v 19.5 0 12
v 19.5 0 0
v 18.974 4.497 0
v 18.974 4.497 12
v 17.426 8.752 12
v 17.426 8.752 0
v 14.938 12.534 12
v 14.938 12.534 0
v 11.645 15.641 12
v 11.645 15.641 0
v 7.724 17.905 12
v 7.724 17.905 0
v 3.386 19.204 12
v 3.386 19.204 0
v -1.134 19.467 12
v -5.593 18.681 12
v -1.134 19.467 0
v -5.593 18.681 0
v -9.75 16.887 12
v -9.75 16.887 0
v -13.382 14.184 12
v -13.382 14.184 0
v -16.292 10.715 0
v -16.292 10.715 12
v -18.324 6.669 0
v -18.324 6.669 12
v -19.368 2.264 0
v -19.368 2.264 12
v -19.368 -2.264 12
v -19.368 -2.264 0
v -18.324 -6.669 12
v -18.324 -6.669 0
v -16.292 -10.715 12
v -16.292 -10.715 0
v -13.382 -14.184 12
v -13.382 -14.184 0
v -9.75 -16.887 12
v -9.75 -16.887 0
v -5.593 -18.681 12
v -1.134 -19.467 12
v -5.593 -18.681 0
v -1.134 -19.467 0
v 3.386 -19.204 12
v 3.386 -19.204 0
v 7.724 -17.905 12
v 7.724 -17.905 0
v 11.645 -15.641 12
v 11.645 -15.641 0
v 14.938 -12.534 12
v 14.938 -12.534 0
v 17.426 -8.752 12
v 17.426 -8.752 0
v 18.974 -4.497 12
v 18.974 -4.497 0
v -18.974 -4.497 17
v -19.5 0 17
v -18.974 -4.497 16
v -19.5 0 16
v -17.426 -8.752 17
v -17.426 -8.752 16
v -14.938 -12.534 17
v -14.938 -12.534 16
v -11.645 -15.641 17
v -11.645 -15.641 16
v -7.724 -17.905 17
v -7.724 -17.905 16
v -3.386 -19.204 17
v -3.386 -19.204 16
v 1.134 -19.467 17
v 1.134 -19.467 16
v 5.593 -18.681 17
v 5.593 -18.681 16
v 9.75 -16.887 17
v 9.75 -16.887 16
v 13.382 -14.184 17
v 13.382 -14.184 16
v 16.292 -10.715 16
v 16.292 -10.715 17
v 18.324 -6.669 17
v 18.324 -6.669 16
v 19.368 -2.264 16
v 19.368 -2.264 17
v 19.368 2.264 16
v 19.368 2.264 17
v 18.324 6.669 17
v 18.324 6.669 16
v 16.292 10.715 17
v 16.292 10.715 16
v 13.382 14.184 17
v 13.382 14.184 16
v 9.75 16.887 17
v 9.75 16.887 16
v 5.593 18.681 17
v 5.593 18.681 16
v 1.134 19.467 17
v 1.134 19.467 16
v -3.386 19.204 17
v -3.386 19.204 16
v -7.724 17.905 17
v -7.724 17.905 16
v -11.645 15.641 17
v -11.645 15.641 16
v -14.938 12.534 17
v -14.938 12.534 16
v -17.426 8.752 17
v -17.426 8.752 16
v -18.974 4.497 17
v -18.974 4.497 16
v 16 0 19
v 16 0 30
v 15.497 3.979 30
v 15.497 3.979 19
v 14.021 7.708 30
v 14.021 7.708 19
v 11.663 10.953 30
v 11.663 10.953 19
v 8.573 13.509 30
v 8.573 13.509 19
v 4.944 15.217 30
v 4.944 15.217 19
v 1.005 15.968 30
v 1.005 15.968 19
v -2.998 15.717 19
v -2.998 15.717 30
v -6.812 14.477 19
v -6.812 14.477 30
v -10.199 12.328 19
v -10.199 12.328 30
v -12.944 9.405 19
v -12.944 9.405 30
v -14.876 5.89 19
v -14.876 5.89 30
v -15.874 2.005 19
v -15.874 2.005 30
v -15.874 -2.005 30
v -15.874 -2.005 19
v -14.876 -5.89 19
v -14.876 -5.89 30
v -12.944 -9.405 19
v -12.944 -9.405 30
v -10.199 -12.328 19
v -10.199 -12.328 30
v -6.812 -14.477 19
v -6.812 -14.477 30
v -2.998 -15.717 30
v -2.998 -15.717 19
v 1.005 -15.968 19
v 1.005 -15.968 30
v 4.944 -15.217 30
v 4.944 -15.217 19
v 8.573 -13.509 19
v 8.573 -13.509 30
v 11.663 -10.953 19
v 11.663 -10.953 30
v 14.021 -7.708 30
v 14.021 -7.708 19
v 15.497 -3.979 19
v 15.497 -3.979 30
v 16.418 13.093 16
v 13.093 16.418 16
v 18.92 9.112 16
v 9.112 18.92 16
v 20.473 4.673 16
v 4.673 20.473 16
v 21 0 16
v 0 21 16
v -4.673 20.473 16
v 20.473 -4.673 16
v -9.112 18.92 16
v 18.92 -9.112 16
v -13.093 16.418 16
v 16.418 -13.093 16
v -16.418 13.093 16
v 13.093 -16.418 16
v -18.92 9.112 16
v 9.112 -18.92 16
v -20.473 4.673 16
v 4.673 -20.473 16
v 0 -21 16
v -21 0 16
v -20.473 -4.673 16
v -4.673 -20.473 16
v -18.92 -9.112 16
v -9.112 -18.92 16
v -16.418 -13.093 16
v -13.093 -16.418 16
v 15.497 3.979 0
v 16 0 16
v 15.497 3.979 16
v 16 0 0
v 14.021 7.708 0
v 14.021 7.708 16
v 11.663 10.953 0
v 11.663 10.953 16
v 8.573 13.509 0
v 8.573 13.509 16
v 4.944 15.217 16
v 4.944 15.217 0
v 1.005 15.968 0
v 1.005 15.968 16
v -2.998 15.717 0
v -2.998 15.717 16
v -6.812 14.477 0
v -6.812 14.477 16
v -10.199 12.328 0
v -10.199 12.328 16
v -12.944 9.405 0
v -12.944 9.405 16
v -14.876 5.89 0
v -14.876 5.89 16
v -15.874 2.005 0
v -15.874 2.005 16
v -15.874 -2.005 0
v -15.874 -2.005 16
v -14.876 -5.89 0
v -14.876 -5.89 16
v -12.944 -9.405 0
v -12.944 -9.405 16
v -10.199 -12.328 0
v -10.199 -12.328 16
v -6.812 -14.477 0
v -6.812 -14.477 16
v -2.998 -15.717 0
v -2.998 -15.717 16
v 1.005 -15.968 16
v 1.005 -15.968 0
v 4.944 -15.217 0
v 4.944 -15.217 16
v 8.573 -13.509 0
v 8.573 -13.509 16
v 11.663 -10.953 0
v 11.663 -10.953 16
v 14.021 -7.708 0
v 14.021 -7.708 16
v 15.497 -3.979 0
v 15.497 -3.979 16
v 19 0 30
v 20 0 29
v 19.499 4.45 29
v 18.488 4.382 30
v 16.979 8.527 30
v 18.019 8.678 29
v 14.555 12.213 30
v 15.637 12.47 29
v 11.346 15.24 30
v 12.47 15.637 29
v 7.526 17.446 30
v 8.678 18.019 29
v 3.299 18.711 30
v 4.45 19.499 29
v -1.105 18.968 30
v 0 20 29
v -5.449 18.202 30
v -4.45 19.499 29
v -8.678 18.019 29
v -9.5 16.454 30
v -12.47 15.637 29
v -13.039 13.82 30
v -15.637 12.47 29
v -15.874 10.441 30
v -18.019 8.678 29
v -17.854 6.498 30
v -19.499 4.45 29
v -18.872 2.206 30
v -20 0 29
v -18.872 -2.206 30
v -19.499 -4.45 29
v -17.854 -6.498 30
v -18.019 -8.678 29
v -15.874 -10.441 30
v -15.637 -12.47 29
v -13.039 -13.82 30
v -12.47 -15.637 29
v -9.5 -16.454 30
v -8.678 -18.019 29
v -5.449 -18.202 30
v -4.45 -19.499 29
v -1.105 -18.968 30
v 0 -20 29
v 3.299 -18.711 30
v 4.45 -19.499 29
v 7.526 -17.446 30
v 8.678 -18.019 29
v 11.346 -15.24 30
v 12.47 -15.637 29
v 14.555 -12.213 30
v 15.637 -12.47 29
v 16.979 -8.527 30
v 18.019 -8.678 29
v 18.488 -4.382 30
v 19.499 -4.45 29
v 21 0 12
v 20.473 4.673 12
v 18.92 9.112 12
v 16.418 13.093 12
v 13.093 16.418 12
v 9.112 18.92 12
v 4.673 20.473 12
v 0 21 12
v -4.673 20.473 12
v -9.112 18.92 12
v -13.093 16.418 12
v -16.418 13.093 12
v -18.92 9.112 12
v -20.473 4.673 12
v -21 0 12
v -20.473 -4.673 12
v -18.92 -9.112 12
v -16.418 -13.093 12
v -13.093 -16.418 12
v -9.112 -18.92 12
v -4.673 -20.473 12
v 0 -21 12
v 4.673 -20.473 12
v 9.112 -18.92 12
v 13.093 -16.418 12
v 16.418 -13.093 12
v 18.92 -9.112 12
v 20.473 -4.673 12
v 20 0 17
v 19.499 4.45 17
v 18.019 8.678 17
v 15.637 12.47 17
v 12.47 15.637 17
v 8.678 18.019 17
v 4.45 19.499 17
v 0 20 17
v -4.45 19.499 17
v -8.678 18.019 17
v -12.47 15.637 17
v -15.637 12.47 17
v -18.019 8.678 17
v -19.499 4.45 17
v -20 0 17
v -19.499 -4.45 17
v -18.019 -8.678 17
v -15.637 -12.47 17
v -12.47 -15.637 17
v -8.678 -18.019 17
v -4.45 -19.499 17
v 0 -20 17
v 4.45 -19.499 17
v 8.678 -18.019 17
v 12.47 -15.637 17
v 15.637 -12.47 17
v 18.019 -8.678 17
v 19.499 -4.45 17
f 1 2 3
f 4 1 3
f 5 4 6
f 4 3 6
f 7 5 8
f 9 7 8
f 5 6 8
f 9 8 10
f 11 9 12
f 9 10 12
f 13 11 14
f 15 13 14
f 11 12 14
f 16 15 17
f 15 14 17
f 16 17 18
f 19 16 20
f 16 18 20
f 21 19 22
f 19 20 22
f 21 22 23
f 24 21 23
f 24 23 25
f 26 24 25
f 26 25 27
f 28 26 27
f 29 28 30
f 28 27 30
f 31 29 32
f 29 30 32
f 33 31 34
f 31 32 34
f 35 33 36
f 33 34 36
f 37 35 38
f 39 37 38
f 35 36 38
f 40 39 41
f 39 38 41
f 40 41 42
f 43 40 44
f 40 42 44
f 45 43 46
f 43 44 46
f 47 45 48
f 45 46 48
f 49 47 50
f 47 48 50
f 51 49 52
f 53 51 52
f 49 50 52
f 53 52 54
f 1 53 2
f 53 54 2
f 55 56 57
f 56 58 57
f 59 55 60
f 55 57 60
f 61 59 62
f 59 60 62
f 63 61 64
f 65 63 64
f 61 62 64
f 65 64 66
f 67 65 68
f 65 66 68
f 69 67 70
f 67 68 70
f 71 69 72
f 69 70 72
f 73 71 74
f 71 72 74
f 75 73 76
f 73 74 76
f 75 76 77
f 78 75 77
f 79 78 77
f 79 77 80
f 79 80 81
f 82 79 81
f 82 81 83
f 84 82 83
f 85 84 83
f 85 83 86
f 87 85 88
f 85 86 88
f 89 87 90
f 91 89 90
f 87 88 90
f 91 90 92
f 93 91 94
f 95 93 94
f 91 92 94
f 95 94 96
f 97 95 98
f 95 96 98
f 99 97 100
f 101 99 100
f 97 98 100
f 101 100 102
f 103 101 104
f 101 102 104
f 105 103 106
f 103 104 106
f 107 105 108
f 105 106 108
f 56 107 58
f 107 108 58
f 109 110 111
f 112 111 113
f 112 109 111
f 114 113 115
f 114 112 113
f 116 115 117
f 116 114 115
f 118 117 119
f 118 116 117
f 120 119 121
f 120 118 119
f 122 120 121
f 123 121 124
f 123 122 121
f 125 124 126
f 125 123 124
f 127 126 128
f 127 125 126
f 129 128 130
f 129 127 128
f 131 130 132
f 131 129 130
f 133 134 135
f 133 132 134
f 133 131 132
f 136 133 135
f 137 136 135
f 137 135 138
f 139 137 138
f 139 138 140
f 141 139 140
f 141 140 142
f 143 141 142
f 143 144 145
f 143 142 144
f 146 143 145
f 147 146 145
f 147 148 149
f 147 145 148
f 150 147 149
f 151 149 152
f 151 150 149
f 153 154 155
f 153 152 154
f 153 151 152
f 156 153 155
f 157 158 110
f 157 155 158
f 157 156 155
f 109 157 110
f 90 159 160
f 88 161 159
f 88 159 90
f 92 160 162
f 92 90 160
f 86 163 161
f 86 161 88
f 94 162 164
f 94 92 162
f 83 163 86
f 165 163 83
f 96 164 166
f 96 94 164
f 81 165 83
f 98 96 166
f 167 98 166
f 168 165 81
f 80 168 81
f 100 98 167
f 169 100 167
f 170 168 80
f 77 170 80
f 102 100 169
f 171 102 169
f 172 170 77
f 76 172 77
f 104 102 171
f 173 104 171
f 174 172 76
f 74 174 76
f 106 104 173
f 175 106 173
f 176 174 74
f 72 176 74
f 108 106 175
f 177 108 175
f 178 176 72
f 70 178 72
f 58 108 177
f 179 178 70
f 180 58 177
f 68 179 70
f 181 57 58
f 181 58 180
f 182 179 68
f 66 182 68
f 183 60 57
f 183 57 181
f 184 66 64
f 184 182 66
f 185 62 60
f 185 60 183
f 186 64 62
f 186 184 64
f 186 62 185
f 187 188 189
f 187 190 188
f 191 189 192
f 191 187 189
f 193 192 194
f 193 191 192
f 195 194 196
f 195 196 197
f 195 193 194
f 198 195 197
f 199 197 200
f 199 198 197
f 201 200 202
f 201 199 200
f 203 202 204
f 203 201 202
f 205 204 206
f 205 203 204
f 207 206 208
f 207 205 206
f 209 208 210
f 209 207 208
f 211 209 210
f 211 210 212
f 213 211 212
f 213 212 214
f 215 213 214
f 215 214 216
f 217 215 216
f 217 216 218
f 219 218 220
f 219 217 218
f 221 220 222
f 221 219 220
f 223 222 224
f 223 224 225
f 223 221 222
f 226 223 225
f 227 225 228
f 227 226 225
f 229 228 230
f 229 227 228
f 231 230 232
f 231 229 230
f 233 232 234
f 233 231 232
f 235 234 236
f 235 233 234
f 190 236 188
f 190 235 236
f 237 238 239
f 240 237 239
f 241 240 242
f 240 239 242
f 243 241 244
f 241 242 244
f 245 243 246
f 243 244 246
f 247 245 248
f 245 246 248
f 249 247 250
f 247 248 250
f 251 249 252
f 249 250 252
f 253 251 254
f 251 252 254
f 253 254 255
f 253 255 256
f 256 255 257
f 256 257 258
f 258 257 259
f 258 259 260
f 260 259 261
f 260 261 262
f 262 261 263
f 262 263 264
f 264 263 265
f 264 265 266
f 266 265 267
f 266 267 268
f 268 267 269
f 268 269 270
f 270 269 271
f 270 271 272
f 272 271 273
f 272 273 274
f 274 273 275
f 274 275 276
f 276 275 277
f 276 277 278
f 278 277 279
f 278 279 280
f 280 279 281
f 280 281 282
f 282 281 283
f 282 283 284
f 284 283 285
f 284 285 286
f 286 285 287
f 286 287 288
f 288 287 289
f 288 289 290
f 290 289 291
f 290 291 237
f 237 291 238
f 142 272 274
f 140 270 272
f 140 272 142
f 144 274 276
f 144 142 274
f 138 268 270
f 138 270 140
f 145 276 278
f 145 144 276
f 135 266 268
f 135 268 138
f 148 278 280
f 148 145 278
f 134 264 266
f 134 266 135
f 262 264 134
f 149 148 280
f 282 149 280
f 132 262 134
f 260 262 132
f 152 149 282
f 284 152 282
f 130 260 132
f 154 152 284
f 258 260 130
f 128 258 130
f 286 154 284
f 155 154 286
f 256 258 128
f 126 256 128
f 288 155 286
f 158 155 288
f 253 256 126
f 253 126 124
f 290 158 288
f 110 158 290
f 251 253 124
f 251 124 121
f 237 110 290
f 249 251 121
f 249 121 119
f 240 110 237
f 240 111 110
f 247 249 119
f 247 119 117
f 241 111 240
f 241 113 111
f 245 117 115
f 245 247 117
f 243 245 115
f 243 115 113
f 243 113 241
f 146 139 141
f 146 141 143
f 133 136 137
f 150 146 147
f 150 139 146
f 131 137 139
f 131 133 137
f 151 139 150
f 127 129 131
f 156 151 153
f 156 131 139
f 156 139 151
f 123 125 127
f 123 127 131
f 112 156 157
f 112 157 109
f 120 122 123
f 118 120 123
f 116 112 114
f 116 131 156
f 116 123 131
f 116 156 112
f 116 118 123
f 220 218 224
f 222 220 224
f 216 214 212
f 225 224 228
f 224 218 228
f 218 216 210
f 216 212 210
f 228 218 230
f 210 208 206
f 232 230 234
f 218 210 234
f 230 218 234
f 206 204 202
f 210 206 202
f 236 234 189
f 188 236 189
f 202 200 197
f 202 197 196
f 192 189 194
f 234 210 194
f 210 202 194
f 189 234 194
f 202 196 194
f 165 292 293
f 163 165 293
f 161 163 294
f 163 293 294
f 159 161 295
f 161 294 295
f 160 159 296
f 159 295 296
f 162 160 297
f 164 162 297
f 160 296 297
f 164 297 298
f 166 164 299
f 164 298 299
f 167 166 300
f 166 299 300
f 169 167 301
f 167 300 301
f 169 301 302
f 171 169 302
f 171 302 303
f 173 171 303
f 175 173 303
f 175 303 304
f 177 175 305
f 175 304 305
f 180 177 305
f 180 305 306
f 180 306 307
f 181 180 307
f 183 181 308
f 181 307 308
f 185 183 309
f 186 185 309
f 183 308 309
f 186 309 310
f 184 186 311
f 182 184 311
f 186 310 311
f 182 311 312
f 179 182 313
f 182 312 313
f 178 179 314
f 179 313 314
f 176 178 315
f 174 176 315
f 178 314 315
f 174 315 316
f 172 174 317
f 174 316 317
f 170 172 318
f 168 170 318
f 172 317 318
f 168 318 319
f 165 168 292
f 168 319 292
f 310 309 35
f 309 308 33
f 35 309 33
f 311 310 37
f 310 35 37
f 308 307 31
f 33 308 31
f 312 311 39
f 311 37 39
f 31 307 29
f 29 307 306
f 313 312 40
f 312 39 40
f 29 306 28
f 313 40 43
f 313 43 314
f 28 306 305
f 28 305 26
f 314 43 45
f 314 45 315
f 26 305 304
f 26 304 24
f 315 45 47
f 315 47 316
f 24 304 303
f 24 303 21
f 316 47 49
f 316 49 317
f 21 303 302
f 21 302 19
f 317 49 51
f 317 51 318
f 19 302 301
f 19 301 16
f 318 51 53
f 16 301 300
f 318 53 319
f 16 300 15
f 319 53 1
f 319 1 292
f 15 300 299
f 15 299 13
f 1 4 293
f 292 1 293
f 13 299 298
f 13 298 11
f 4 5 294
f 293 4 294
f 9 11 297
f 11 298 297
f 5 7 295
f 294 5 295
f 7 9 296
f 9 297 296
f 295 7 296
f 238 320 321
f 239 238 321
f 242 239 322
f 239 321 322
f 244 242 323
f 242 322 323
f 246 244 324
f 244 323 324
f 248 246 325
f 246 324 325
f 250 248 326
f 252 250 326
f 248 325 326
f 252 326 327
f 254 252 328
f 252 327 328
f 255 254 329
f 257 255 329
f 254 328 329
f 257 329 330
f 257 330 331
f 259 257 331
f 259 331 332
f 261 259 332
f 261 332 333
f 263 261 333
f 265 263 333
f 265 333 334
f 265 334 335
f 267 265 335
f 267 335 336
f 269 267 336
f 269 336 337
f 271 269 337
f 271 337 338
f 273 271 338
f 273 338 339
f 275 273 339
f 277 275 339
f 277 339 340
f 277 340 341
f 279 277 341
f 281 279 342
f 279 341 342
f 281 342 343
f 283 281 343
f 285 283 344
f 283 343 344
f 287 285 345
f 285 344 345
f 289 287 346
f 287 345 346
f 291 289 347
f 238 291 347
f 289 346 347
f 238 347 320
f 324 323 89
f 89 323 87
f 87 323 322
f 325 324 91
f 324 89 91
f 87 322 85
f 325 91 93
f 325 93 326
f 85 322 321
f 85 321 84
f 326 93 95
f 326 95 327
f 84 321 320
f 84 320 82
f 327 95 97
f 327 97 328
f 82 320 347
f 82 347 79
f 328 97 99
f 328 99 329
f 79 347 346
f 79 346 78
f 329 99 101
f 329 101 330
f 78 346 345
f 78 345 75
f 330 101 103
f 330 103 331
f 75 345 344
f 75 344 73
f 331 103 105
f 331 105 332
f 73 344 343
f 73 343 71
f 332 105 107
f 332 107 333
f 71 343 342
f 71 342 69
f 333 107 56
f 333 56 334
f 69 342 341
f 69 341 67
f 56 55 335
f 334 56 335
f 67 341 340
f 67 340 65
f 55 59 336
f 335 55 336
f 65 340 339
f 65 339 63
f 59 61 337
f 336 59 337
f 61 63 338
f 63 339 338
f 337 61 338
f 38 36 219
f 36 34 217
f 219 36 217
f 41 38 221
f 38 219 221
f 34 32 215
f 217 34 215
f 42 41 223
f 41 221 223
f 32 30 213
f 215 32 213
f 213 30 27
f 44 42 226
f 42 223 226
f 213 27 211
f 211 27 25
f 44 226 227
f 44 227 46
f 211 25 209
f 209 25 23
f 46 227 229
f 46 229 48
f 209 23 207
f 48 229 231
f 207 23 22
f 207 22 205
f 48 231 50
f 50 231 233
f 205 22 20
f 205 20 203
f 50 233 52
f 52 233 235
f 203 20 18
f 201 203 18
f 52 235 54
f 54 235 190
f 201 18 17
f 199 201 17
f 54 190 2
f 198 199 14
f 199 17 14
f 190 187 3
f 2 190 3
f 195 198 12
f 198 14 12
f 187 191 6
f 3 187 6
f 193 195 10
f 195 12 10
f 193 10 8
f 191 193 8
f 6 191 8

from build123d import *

# Parameters (mm, degrees)
SKETCH_1_R          = 19.5
SKETCH_1_R_2        = 16
EXTRUDE_1_DEPTH     = 12
SKETCH_2_R          = 21
SKETCH_2_R_2        = 16
EXTRUDE_2_DEPTH     = 4
SKETCH_3_R          = 20
EXTRUDE_3_DEPTH     = 3
SKETCH_4_R          = 20
SKETCH_4_R_2        = 16
EXTRUDE_4_DEPTH     = 14
SKETCH_6_R          = 20
SKETCH_6_R_2        = 19
CUT_EXTRUDE_1_DEPTH = 1.5
CUT_EXTRUDE_START   = -3
SKETCH_7_R          = 20
CUT_EXTRUDE_2_DEPTH = 3
CHAMFER_1_SIZE      = 1
SKETCH_8_W          = 0.5
SKETCH_8_H          = 1


with BuildPart() as part:
    # 草图1 → 拉伸1 (new body)
    with BuildSketch(Plane.XY):
        Circle(SKETCH_1_R)
        Circle(SKETCH_1_R_2, mode=Mode.SUBTRACT)
    extrude(amount=EXTRUDE_1_DEPTH)

    # 草图2 → 拉伸2 (add)
    with BuildSketch(Plane.XY.offset(12)):
        Circle(SKETCH_2_R)
        Circle(SKETCH_2_R_2, mode=Mode.SUBTRACT)
    extrude(amount=EXTRUDE_2_DEPTH)

    # 草图3 → 拉伸3 (add)
    with BuildSketch(Plane.XY.offset(16)):
        Circle(SKETCH_3_R)
    extrude(amount=EXTRUDE_3_DEPTH)

    # 草图4 → 拉伸4 (add)
    with BuildSketch(Plane.XY.offset(19)):
        Circle(SKETCH_4_R)
        Circle(SKETCH_4_R_2, mode=Mode.SUBTRACT)
    extrude(amount=EXTRUDE_4_DEPTH)

    # 草图6 → 切除-拉伸1 (cut)
    with BuildSketch(Plane.XY.offset(30)):
        Circle(SKETCH_6_R)
        Circle(SKETCH_6_R_2, mode=Mode.SUBTRACT)
    extrude(amount=CUT_EXTRUDE_1_DEPTH, mode=Mode.SUBTRACT)

    # 草图7 → 切除-拉伸2 (cut)
    with BuildSketch(Plane.XY.offset(33).offset(CUT_EXTRUDE_START)):
        Circle(SKETCH_7_R)
    extrude(amount=CUT_EXTRUDE_2_DEPTH, mode=Mode.SUBTRACT)

    # 倒角1
    chamfer_1_edges = [part.edges().sort_by_distance(p)[0] for p in [
        (-20, 0, 30),
    ]]
    chamfer(chamfer_1_edges, length=CHAMFER_1_SIZE)

    # 草图8 → 切除-旋转1 (revolve, cut)
    with BuildSketch(Plane(origin=(0, 0, 0), x_dir=(1, 0, 0), z_dir=(0, 1, 0))):
        with Locations((-19.75, -16.5)):
            Rectangle(SKETCH_8_W, SKETCH_8_H)
    revolve(axis=Axis((0, 0, 0), (0, 0, 1)), mode=Mode.SUBTRACT)


solid = part.part
